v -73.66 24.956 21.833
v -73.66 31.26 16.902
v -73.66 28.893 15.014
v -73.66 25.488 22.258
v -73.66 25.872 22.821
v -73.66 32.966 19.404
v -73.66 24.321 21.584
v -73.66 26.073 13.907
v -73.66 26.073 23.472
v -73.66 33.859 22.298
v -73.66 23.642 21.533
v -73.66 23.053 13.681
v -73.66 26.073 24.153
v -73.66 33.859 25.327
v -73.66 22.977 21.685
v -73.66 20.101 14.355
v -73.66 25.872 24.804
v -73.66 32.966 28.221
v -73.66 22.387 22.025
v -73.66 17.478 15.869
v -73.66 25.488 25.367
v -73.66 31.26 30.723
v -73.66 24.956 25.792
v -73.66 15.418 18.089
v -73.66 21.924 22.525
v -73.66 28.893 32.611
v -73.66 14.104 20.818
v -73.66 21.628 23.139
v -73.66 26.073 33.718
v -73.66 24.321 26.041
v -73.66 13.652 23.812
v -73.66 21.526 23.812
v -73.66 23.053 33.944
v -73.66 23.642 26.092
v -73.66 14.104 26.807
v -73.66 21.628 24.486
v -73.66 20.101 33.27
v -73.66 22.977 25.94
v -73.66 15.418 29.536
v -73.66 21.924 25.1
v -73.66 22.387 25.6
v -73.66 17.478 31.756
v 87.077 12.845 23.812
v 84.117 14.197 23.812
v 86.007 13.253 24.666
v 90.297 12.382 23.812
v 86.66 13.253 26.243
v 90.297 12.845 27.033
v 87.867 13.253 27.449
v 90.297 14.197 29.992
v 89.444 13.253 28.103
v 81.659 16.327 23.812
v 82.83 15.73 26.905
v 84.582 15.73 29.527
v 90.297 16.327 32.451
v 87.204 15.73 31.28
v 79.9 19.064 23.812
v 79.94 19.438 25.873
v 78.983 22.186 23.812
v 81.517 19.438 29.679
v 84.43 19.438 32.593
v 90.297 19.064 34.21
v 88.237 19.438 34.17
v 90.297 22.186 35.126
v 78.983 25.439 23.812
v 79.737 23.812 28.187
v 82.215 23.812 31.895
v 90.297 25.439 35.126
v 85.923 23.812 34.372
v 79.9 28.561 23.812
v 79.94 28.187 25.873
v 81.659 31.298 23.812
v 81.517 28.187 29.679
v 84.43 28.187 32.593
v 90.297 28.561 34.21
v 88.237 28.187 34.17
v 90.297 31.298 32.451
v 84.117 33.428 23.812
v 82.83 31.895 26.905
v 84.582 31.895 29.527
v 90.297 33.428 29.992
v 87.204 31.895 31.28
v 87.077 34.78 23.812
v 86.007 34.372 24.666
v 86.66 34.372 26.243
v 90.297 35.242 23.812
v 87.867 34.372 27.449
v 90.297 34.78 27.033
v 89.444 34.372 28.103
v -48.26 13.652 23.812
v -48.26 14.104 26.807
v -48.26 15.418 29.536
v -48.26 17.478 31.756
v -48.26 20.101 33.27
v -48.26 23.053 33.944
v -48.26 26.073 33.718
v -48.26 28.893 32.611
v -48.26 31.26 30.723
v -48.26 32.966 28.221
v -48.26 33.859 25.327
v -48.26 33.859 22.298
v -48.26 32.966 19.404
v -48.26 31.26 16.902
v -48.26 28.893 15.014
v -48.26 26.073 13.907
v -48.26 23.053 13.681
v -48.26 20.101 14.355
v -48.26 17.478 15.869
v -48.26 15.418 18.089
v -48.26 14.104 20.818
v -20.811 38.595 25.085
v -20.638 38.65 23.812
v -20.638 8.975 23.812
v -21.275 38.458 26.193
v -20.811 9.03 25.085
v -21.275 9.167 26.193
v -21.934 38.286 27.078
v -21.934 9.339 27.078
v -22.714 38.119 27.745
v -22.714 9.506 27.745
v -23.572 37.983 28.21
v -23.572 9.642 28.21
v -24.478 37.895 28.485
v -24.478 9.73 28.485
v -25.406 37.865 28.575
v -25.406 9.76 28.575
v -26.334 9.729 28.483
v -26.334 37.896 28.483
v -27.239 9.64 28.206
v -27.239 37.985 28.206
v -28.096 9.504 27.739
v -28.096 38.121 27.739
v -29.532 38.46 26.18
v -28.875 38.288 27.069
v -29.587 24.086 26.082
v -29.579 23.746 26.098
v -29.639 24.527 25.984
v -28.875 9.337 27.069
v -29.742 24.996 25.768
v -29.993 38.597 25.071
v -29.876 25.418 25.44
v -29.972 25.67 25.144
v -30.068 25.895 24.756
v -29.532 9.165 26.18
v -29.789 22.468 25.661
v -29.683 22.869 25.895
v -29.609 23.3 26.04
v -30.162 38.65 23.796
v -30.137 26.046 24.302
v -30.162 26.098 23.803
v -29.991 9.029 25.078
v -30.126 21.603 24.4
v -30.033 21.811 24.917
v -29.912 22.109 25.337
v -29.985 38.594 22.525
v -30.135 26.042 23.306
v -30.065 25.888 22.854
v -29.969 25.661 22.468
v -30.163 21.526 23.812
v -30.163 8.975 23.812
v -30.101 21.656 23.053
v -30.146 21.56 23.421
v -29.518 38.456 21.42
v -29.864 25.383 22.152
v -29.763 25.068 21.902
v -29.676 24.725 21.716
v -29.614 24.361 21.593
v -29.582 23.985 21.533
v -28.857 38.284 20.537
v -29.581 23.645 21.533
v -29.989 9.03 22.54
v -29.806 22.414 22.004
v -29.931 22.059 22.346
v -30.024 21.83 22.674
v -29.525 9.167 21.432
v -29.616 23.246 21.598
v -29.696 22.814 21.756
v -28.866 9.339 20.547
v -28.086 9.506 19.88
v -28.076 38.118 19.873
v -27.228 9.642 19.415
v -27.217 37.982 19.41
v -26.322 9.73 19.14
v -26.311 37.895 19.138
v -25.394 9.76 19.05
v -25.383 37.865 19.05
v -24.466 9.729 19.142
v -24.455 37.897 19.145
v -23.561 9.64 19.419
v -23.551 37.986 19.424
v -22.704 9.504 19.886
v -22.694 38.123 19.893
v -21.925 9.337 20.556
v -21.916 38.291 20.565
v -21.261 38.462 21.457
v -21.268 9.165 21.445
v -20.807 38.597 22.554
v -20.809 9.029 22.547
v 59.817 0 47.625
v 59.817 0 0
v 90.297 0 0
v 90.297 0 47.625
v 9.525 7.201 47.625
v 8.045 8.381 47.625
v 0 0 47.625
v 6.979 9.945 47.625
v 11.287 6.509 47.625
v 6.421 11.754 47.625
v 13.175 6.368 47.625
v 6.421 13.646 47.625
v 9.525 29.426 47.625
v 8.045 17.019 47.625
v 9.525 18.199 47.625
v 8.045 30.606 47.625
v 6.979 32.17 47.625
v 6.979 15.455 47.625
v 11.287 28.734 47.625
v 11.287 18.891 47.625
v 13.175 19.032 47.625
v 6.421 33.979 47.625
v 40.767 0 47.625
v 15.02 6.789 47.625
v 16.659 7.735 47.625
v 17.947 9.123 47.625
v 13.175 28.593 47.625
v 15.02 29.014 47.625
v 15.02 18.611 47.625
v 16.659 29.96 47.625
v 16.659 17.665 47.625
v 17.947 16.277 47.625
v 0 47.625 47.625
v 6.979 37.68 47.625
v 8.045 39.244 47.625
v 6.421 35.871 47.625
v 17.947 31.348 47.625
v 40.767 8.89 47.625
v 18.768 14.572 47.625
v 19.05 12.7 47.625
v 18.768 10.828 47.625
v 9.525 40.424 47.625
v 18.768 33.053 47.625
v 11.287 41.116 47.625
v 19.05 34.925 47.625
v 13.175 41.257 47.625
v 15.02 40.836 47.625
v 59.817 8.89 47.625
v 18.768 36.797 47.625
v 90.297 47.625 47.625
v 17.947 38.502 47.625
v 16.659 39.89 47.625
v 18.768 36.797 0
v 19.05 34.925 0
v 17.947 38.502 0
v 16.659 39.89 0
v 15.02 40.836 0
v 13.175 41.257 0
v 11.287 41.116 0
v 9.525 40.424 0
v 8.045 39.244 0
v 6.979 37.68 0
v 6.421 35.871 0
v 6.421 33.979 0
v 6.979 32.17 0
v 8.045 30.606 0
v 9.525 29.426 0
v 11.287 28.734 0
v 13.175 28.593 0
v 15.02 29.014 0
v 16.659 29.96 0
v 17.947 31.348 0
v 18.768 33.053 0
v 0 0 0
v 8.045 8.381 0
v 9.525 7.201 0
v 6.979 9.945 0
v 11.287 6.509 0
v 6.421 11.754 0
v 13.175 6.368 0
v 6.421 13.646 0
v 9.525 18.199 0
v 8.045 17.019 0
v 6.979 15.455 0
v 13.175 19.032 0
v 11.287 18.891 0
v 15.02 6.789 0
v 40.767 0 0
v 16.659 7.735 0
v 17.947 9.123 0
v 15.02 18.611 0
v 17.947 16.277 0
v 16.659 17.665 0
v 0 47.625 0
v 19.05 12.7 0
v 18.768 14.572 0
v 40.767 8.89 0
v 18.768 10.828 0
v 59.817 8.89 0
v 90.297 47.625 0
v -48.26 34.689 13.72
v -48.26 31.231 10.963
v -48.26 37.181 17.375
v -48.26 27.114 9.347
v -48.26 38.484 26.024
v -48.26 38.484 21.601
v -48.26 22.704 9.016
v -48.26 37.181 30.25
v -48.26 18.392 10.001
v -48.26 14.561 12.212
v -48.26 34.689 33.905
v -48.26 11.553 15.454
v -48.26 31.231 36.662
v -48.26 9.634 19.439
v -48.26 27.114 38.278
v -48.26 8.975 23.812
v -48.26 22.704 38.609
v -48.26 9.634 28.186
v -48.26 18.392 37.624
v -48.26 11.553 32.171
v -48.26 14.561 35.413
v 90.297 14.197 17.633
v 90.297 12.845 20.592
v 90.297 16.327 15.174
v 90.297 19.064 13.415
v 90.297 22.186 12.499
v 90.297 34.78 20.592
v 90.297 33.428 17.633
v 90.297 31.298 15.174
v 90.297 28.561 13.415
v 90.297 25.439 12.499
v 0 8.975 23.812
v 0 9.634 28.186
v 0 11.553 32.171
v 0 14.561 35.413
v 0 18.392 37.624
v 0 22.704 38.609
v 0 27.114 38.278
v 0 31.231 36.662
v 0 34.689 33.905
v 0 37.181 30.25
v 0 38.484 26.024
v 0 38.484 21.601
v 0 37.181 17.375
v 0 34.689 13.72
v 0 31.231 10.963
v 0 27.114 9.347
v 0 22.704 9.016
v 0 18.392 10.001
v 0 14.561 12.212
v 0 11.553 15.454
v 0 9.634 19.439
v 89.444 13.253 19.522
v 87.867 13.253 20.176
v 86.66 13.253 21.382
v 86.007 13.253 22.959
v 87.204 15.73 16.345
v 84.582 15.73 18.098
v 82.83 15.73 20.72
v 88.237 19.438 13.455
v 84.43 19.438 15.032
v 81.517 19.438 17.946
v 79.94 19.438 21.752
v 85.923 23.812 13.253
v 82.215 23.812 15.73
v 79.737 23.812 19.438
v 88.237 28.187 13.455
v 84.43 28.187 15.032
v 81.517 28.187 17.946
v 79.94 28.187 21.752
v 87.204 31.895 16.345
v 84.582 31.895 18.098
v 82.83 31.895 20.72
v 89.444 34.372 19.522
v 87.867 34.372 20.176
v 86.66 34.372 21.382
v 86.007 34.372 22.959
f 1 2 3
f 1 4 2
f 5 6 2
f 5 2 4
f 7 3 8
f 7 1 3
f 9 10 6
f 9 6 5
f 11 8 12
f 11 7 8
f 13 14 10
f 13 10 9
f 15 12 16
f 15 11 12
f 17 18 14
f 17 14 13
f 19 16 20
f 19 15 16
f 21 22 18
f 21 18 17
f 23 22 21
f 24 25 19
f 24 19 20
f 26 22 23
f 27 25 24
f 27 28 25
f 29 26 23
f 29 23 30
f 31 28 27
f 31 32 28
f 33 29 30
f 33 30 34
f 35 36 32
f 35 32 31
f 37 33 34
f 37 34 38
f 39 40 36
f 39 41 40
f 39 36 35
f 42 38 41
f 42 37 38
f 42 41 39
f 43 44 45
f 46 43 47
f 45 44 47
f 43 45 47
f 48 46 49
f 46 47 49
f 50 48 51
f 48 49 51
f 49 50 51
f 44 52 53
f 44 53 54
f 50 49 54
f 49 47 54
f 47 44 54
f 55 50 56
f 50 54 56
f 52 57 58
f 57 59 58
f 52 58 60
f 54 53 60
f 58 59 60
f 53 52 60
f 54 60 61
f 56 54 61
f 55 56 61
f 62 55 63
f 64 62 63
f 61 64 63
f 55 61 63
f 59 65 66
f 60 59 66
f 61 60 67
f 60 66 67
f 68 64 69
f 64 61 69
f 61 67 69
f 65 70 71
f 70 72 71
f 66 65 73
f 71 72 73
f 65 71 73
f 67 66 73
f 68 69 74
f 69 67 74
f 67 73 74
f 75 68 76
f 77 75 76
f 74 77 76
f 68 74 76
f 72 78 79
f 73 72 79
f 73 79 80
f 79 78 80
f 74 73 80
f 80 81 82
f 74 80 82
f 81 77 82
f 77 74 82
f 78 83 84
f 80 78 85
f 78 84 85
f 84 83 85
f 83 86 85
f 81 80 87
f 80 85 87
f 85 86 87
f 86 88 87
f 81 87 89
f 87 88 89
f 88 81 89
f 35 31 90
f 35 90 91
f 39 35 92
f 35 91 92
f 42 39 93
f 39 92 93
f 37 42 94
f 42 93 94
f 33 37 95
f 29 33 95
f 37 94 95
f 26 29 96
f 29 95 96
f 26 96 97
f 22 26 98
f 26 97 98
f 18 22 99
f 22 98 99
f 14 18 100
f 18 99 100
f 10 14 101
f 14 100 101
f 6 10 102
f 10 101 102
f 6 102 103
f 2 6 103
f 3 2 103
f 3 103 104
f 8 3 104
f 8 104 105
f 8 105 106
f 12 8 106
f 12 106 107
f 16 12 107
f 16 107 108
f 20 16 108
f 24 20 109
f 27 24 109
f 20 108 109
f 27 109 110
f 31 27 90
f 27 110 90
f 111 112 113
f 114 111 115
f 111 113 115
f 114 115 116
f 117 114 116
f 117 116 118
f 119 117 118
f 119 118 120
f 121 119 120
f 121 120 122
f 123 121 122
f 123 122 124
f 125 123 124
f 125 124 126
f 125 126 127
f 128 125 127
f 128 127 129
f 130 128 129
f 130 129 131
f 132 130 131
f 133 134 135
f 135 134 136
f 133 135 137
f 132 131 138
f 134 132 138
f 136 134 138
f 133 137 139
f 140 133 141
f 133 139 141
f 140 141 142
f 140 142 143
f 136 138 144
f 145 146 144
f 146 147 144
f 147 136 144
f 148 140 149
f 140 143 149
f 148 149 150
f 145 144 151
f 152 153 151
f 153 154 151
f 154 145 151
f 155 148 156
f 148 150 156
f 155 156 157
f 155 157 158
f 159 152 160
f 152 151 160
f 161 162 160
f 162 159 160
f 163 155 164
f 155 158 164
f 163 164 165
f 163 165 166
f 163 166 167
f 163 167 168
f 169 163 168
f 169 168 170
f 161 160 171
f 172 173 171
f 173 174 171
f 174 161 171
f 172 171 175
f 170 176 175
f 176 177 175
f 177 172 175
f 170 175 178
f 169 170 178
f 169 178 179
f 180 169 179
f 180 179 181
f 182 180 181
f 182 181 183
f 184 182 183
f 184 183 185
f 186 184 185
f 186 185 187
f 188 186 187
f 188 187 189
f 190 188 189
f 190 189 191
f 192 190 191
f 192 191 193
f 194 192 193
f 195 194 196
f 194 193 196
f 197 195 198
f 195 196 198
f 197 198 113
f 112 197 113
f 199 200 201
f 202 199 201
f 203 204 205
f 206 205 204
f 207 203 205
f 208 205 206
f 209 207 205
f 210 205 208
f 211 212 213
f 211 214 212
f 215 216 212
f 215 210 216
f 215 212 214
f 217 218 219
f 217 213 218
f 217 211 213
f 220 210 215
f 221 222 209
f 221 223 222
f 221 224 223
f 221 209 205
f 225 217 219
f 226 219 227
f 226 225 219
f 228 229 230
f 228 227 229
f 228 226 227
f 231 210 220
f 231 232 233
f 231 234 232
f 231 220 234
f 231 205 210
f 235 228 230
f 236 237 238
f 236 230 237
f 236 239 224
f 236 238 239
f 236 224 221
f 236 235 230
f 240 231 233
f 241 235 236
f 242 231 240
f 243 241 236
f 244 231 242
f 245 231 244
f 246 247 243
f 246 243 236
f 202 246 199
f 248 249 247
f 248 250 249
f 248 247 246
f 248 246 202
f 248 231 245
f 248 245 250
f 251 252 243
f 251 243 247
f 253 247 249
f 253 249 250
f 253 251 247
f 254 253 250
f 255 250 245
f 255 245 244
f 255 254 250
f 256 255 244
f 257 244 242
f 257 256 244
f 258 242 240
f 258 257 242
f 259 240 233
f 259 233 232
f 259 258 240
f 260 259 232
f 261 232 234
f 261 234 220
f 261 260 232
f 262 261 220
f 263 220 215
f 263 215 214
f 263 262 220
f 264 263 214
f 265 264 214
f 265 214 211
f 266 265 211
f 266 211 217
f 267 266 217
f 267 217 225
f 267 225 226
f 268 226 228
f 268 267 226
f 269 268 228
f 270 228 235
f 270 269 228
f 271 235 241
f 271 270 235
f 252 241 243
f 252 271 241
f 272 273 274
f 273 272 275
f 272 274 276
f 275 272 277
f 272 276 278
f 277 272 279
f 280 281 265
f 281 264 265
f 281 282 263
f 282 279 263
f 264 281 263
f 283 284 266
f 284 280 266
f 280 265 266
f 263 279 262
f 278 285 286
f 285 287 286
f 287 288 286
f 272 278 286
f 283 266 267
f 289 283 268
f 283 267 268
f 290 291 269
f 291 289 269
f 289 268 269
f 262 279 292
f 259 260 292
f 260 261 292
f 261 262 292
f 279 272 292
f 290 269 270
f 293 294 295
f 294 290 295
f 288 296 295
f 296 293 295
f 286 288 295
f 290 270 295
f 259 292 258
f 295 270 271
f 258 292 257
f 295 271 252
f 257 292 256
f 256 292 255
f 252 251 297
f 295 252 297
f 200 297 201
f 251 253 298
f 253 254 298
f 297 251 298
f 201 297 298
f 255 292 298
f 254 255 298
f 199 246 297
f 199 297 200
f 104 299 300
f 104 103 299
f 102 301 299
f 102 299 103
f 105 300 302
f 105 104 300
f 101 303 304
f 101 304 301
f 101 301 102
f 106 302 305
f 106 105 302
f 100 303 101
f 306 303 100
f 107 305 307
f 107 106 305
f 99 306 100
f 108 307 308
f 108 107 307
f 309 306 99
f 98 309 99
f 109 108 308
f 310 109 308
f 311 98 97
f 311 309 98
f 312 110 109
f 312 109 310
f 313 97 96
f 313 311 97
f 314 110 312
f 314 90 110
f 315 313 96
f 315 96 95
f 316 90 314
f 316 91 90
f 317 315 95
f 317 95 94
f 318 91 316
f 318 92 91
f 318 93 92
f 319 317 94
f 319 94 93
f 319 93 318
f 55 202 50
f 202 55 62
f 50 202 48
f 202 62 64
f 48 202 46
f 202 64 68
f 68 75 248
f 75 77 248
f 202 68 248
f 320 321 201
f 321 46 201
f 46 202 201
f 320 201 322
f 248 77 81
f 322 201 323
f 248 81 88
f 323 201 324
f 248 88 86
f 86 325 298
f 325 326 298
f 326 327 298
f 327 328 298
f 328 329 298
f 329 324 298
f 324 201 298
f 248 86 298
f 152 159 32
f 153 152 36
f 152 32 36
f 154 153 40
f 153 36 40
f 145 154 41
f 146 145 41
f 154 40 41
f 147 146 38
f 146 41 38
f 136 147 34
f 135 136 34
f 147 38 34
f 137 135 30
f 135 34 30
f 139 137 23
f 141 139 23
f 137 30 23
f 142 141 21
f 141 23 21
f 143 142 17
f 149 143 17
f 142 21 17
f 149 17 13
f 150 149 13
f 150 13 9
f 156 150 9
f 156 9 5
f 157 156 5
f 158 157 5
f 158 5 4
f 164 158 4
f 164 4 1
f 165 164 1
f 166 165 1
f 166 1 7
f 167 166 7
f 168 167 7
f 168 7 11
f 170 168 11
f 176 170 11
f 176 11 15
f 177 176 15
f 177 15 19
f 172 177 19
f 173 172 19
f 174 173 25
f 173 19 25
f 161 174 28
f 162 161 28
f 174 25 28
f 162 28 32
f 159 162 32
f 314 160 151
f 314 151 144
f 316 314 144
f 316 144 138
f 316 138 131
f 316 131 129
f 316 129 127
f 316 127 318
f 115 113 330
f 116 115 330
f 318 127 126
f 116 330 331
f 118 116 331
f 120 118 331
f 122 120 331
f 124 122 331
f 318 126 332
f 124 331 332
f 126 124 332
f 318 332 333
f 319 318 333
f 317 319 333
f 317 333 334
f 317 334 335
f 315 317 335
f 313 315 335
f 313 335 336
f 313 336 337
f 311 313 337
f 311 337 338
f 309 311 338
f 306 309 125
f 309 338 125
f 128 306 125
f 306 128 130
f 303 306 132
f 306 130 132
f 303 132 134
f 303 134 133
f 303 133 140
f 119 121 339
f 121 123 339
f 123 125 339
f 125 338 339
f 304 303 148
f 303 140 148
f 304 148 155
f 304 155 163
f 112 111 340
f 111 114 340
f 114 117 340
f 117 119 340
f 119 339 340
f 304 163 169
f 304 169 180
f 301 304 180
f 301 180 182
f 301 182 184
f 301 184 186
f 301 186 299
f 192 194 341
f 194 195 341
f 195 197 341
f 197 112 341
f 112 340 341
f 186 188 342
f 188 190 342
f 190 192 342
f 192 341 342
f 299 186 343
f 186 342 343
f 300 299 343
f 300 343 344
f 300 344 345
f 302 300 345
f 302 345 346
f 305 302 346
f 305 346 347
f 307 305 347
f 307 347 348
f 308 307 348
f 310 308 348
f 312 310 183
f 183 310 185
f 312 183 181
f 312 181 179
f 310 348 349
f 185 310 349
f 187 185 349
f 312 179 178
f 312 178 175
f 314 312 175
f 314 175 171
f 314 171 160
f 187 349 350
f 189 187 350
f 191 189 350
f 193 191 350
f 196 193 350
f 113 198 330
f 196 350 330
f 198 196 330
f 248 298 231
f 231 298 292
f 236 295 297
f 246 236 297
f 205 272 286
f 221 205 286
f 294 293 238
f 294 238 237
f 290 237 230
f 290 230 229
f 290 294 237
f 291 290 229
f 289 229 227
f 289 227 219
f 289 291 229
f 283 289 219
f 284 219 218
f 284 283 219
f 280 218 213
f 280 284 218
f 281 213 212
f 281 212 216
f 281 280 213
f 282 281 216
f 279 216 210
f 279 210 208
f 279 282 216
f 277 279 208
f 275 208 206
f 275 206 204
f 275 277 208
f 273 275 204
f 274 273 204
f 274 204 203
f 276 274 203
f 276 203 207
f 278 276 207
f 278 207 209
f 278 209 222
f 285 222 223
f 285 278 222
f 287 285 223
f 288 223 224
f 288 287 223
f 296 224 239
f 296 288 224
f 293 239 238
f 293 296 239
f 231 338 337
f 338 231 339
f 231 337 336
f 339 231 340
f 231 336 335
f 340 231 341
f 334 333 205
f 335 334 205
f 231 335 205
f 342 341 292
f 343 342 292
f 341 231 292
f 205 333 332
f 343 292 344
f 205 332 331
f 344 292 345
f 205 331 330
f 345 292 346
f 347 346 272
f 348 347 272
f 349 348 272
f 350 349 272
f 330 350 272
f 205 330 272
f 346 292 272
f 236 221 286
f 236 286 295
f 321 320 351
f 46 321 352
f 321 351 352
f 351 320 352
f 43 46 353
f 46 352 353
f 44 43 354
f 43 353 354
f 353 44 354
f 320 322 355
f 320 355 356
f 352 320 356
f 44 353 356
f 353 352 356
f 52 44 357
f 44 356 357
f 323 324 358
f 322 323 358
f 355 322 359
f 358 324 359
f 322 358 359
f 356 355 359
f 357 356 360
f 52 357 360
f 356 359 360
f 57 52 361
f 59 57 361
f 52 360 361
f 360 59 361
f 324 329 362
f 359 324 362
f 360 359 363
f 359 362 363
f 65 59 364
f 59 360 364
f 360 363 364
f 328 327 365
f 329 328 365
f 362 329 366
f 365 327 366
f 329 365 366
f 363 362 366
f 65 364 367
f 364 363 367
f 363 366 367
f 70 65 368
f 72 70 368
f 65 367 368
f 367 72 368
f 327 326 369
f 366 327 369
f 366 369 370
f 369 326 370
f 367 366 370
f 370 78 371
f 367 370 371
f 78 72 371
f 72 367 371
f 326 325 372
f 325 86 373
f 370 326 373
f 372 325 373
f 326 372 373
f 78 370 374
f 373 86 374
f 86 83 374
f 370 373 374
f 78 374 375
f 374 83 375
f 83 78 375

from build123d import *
from build123d import SkipClean  # not in build123d's __all__

# Parameters (mm, degrees)
F0_R      = 6.35
F1_DEPTH  = 47.625
F5_R      = 14.8376639977
F6_DEPTH  = 48.26
F7_R      = 10.16
F8_DEPTH  = 25.4
F10_R     = 4.7625
F11_DEPTH = 127
F9_R      = 2.286
F12_DEPTH = 44.083008926


with BuildPart() as f1:
    # F0 (on Top) → F1 (new body)
    with BuildSketch(Plane.XY):
        Polygon((0, 47.625), (0, 0), (40.767, 0), (40.767, 8.89), (59.817, 8.89), (59.817, 0), (90.297, 0), (90.297, 47.625), align=None)
        with Locations((12.7, 12.7)):
            Circle(F0_R, mode=Mode.SUBTRACT)
        with Locations((12.7, 34.925)):
            Circle(F0_R, mode=Mode.SUBTRACT)
    extrude(amount=F1_DEPTH)

    # F3 (on offset) → F4 (revolve, cut)
    with BuildSketch(Plane(origin=(0, 0, 23.8125), x_dir=(1, 0, 0), z_dir=(0, 0, -1))):
        with BuildLine():
            Line((90.297, -35.2425), (90.297, -12.3825))
            ThreePointArc((90.297, -12.3825), (78.867, -23.8125), (90.297, -35.2425))
        make_face()
    with SkipClean():  # cleaning this boolean's faces spoils the solid; the shape is the same uncleaned
        revolve(axis=Axis((90.297, 23.8125, 23.8125), (0, 1, 0)), mode=Mode.SUBTRACT)

    # F5 (on face) → F6 (join)
    with BuildSketch(Plane(origin=(0, 0, 0), x_dir=(0, -1, 0), z_dir=(-1, 0, 0))):
        with Locations((-23.8125, 23.8125)):
            Circle(F5_R)
    with SkipClean():  # cleaning this boolean's faces spoils the solid; the shape is the same uncleaned
        extrude(amount=F6_DEPTH)

    # F7 (on face) → F8 (join)
    with BuildSketch(Plane(origin=(-48.26, 0, 0), x_dir=(0, -1, 0), z_dir=(-1, 0, 0))):
        with Locations((-23.8125, 23.8125)):
            Circle(F7_R)
    with SkipClean():  # cleaning this boolean's faces spoils the solid; the shape is the same uncleaned
        extrude(amount=F8_DEPTH)

    # F10 (on Front) → F11 (cut)
    with BuildSketch(Plane.XZ):
        with Locations((-25.4, 23.8125)):
            Circle(F10_R)
    with SkipClean():  # cleaning this boolean's faces spoils the solid; the shape is the same uncleaned
        extrude(amount=-F11_DEPTH, mode=Mode.SUBTRACT)

    # F9 (on face) → F12 (cut, through all)
    with BuildSketch(Plane(origin=(-73.66, 0, 0), x_dir=(0, -1, 0), z_dir=(-1, 0, 0))):
        with Locations((-23.8125, 23.8125)):
            Circle(F9_R)
    with SkipClean():  # cleaning this boolean's faces spoils the solid; the shape is the same uncleaned
        extrude(amount=-F12_DEPTH, mode=Mode.SUBTRACT)


solid = f1.part
